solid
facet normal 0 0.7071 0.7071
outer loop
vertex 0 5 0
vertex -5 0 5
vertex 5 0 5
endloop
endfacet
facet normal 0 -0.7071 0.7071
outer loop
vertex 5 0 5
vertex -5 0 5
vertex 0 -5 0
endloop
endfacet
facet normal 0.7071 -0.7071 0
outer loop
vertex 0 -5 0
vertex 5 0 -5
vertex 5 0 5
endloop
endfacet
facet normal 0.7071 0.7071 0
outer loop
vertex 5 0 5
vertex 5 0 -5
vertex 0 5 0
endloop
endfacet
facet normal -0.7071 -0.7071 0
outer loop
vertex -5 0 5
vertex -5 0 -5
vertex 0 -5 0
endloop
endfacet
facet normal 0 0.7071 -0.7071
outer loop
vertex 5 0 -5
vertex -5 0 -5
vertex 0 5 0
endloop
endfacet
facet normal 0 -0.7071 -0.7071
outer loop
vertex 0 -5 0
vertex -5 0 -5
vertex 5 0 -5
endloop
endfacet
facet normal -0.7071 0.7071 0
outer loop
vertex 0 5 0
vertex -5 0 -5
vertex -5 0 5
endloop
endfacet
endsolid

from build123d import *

# Parameters (mm, degrees)
F0_W     = 10
F0_H     = 10
F1_DEPTH = 5
F2_SIZE2 = 4.99999
F2_SIZE  = 4.99999


# Not quite as in the source:
# - a fillet or chamfer is up to 0.001 mm smaller than in the source, because OpenCascade refuses the exact size
# - a feature names something its author has since deleted; it is built from what else it names


with BuildPart() as f1:
    # F0 (on Front) → F1 (new body, symmetric)
    with BuildSketch(Plane.XZ):
        Rectangle(F0_W, F0_H)
    extrude(amount=F1_DEPTH, both=True)

    # F2 (size 5 and 5 in the source; OpenCascade refuses exactly that, so slightly less here)
    f2_edges = [f1.edges().sort_by_distance(p)[0] for p in [
        (0, -5, 5),
        (-5, -5, 0),
        (0, -5, -5),
        (5, -5, 0),
        (0, 5, 5),
        (-5, 5, 0),
        (0, 5, -5),
        (5, 5, 0),
    ]]
    chamfer(f2_edges, length=F2_SIZE, length2=F2_SIZE2)


solid = f1.part
